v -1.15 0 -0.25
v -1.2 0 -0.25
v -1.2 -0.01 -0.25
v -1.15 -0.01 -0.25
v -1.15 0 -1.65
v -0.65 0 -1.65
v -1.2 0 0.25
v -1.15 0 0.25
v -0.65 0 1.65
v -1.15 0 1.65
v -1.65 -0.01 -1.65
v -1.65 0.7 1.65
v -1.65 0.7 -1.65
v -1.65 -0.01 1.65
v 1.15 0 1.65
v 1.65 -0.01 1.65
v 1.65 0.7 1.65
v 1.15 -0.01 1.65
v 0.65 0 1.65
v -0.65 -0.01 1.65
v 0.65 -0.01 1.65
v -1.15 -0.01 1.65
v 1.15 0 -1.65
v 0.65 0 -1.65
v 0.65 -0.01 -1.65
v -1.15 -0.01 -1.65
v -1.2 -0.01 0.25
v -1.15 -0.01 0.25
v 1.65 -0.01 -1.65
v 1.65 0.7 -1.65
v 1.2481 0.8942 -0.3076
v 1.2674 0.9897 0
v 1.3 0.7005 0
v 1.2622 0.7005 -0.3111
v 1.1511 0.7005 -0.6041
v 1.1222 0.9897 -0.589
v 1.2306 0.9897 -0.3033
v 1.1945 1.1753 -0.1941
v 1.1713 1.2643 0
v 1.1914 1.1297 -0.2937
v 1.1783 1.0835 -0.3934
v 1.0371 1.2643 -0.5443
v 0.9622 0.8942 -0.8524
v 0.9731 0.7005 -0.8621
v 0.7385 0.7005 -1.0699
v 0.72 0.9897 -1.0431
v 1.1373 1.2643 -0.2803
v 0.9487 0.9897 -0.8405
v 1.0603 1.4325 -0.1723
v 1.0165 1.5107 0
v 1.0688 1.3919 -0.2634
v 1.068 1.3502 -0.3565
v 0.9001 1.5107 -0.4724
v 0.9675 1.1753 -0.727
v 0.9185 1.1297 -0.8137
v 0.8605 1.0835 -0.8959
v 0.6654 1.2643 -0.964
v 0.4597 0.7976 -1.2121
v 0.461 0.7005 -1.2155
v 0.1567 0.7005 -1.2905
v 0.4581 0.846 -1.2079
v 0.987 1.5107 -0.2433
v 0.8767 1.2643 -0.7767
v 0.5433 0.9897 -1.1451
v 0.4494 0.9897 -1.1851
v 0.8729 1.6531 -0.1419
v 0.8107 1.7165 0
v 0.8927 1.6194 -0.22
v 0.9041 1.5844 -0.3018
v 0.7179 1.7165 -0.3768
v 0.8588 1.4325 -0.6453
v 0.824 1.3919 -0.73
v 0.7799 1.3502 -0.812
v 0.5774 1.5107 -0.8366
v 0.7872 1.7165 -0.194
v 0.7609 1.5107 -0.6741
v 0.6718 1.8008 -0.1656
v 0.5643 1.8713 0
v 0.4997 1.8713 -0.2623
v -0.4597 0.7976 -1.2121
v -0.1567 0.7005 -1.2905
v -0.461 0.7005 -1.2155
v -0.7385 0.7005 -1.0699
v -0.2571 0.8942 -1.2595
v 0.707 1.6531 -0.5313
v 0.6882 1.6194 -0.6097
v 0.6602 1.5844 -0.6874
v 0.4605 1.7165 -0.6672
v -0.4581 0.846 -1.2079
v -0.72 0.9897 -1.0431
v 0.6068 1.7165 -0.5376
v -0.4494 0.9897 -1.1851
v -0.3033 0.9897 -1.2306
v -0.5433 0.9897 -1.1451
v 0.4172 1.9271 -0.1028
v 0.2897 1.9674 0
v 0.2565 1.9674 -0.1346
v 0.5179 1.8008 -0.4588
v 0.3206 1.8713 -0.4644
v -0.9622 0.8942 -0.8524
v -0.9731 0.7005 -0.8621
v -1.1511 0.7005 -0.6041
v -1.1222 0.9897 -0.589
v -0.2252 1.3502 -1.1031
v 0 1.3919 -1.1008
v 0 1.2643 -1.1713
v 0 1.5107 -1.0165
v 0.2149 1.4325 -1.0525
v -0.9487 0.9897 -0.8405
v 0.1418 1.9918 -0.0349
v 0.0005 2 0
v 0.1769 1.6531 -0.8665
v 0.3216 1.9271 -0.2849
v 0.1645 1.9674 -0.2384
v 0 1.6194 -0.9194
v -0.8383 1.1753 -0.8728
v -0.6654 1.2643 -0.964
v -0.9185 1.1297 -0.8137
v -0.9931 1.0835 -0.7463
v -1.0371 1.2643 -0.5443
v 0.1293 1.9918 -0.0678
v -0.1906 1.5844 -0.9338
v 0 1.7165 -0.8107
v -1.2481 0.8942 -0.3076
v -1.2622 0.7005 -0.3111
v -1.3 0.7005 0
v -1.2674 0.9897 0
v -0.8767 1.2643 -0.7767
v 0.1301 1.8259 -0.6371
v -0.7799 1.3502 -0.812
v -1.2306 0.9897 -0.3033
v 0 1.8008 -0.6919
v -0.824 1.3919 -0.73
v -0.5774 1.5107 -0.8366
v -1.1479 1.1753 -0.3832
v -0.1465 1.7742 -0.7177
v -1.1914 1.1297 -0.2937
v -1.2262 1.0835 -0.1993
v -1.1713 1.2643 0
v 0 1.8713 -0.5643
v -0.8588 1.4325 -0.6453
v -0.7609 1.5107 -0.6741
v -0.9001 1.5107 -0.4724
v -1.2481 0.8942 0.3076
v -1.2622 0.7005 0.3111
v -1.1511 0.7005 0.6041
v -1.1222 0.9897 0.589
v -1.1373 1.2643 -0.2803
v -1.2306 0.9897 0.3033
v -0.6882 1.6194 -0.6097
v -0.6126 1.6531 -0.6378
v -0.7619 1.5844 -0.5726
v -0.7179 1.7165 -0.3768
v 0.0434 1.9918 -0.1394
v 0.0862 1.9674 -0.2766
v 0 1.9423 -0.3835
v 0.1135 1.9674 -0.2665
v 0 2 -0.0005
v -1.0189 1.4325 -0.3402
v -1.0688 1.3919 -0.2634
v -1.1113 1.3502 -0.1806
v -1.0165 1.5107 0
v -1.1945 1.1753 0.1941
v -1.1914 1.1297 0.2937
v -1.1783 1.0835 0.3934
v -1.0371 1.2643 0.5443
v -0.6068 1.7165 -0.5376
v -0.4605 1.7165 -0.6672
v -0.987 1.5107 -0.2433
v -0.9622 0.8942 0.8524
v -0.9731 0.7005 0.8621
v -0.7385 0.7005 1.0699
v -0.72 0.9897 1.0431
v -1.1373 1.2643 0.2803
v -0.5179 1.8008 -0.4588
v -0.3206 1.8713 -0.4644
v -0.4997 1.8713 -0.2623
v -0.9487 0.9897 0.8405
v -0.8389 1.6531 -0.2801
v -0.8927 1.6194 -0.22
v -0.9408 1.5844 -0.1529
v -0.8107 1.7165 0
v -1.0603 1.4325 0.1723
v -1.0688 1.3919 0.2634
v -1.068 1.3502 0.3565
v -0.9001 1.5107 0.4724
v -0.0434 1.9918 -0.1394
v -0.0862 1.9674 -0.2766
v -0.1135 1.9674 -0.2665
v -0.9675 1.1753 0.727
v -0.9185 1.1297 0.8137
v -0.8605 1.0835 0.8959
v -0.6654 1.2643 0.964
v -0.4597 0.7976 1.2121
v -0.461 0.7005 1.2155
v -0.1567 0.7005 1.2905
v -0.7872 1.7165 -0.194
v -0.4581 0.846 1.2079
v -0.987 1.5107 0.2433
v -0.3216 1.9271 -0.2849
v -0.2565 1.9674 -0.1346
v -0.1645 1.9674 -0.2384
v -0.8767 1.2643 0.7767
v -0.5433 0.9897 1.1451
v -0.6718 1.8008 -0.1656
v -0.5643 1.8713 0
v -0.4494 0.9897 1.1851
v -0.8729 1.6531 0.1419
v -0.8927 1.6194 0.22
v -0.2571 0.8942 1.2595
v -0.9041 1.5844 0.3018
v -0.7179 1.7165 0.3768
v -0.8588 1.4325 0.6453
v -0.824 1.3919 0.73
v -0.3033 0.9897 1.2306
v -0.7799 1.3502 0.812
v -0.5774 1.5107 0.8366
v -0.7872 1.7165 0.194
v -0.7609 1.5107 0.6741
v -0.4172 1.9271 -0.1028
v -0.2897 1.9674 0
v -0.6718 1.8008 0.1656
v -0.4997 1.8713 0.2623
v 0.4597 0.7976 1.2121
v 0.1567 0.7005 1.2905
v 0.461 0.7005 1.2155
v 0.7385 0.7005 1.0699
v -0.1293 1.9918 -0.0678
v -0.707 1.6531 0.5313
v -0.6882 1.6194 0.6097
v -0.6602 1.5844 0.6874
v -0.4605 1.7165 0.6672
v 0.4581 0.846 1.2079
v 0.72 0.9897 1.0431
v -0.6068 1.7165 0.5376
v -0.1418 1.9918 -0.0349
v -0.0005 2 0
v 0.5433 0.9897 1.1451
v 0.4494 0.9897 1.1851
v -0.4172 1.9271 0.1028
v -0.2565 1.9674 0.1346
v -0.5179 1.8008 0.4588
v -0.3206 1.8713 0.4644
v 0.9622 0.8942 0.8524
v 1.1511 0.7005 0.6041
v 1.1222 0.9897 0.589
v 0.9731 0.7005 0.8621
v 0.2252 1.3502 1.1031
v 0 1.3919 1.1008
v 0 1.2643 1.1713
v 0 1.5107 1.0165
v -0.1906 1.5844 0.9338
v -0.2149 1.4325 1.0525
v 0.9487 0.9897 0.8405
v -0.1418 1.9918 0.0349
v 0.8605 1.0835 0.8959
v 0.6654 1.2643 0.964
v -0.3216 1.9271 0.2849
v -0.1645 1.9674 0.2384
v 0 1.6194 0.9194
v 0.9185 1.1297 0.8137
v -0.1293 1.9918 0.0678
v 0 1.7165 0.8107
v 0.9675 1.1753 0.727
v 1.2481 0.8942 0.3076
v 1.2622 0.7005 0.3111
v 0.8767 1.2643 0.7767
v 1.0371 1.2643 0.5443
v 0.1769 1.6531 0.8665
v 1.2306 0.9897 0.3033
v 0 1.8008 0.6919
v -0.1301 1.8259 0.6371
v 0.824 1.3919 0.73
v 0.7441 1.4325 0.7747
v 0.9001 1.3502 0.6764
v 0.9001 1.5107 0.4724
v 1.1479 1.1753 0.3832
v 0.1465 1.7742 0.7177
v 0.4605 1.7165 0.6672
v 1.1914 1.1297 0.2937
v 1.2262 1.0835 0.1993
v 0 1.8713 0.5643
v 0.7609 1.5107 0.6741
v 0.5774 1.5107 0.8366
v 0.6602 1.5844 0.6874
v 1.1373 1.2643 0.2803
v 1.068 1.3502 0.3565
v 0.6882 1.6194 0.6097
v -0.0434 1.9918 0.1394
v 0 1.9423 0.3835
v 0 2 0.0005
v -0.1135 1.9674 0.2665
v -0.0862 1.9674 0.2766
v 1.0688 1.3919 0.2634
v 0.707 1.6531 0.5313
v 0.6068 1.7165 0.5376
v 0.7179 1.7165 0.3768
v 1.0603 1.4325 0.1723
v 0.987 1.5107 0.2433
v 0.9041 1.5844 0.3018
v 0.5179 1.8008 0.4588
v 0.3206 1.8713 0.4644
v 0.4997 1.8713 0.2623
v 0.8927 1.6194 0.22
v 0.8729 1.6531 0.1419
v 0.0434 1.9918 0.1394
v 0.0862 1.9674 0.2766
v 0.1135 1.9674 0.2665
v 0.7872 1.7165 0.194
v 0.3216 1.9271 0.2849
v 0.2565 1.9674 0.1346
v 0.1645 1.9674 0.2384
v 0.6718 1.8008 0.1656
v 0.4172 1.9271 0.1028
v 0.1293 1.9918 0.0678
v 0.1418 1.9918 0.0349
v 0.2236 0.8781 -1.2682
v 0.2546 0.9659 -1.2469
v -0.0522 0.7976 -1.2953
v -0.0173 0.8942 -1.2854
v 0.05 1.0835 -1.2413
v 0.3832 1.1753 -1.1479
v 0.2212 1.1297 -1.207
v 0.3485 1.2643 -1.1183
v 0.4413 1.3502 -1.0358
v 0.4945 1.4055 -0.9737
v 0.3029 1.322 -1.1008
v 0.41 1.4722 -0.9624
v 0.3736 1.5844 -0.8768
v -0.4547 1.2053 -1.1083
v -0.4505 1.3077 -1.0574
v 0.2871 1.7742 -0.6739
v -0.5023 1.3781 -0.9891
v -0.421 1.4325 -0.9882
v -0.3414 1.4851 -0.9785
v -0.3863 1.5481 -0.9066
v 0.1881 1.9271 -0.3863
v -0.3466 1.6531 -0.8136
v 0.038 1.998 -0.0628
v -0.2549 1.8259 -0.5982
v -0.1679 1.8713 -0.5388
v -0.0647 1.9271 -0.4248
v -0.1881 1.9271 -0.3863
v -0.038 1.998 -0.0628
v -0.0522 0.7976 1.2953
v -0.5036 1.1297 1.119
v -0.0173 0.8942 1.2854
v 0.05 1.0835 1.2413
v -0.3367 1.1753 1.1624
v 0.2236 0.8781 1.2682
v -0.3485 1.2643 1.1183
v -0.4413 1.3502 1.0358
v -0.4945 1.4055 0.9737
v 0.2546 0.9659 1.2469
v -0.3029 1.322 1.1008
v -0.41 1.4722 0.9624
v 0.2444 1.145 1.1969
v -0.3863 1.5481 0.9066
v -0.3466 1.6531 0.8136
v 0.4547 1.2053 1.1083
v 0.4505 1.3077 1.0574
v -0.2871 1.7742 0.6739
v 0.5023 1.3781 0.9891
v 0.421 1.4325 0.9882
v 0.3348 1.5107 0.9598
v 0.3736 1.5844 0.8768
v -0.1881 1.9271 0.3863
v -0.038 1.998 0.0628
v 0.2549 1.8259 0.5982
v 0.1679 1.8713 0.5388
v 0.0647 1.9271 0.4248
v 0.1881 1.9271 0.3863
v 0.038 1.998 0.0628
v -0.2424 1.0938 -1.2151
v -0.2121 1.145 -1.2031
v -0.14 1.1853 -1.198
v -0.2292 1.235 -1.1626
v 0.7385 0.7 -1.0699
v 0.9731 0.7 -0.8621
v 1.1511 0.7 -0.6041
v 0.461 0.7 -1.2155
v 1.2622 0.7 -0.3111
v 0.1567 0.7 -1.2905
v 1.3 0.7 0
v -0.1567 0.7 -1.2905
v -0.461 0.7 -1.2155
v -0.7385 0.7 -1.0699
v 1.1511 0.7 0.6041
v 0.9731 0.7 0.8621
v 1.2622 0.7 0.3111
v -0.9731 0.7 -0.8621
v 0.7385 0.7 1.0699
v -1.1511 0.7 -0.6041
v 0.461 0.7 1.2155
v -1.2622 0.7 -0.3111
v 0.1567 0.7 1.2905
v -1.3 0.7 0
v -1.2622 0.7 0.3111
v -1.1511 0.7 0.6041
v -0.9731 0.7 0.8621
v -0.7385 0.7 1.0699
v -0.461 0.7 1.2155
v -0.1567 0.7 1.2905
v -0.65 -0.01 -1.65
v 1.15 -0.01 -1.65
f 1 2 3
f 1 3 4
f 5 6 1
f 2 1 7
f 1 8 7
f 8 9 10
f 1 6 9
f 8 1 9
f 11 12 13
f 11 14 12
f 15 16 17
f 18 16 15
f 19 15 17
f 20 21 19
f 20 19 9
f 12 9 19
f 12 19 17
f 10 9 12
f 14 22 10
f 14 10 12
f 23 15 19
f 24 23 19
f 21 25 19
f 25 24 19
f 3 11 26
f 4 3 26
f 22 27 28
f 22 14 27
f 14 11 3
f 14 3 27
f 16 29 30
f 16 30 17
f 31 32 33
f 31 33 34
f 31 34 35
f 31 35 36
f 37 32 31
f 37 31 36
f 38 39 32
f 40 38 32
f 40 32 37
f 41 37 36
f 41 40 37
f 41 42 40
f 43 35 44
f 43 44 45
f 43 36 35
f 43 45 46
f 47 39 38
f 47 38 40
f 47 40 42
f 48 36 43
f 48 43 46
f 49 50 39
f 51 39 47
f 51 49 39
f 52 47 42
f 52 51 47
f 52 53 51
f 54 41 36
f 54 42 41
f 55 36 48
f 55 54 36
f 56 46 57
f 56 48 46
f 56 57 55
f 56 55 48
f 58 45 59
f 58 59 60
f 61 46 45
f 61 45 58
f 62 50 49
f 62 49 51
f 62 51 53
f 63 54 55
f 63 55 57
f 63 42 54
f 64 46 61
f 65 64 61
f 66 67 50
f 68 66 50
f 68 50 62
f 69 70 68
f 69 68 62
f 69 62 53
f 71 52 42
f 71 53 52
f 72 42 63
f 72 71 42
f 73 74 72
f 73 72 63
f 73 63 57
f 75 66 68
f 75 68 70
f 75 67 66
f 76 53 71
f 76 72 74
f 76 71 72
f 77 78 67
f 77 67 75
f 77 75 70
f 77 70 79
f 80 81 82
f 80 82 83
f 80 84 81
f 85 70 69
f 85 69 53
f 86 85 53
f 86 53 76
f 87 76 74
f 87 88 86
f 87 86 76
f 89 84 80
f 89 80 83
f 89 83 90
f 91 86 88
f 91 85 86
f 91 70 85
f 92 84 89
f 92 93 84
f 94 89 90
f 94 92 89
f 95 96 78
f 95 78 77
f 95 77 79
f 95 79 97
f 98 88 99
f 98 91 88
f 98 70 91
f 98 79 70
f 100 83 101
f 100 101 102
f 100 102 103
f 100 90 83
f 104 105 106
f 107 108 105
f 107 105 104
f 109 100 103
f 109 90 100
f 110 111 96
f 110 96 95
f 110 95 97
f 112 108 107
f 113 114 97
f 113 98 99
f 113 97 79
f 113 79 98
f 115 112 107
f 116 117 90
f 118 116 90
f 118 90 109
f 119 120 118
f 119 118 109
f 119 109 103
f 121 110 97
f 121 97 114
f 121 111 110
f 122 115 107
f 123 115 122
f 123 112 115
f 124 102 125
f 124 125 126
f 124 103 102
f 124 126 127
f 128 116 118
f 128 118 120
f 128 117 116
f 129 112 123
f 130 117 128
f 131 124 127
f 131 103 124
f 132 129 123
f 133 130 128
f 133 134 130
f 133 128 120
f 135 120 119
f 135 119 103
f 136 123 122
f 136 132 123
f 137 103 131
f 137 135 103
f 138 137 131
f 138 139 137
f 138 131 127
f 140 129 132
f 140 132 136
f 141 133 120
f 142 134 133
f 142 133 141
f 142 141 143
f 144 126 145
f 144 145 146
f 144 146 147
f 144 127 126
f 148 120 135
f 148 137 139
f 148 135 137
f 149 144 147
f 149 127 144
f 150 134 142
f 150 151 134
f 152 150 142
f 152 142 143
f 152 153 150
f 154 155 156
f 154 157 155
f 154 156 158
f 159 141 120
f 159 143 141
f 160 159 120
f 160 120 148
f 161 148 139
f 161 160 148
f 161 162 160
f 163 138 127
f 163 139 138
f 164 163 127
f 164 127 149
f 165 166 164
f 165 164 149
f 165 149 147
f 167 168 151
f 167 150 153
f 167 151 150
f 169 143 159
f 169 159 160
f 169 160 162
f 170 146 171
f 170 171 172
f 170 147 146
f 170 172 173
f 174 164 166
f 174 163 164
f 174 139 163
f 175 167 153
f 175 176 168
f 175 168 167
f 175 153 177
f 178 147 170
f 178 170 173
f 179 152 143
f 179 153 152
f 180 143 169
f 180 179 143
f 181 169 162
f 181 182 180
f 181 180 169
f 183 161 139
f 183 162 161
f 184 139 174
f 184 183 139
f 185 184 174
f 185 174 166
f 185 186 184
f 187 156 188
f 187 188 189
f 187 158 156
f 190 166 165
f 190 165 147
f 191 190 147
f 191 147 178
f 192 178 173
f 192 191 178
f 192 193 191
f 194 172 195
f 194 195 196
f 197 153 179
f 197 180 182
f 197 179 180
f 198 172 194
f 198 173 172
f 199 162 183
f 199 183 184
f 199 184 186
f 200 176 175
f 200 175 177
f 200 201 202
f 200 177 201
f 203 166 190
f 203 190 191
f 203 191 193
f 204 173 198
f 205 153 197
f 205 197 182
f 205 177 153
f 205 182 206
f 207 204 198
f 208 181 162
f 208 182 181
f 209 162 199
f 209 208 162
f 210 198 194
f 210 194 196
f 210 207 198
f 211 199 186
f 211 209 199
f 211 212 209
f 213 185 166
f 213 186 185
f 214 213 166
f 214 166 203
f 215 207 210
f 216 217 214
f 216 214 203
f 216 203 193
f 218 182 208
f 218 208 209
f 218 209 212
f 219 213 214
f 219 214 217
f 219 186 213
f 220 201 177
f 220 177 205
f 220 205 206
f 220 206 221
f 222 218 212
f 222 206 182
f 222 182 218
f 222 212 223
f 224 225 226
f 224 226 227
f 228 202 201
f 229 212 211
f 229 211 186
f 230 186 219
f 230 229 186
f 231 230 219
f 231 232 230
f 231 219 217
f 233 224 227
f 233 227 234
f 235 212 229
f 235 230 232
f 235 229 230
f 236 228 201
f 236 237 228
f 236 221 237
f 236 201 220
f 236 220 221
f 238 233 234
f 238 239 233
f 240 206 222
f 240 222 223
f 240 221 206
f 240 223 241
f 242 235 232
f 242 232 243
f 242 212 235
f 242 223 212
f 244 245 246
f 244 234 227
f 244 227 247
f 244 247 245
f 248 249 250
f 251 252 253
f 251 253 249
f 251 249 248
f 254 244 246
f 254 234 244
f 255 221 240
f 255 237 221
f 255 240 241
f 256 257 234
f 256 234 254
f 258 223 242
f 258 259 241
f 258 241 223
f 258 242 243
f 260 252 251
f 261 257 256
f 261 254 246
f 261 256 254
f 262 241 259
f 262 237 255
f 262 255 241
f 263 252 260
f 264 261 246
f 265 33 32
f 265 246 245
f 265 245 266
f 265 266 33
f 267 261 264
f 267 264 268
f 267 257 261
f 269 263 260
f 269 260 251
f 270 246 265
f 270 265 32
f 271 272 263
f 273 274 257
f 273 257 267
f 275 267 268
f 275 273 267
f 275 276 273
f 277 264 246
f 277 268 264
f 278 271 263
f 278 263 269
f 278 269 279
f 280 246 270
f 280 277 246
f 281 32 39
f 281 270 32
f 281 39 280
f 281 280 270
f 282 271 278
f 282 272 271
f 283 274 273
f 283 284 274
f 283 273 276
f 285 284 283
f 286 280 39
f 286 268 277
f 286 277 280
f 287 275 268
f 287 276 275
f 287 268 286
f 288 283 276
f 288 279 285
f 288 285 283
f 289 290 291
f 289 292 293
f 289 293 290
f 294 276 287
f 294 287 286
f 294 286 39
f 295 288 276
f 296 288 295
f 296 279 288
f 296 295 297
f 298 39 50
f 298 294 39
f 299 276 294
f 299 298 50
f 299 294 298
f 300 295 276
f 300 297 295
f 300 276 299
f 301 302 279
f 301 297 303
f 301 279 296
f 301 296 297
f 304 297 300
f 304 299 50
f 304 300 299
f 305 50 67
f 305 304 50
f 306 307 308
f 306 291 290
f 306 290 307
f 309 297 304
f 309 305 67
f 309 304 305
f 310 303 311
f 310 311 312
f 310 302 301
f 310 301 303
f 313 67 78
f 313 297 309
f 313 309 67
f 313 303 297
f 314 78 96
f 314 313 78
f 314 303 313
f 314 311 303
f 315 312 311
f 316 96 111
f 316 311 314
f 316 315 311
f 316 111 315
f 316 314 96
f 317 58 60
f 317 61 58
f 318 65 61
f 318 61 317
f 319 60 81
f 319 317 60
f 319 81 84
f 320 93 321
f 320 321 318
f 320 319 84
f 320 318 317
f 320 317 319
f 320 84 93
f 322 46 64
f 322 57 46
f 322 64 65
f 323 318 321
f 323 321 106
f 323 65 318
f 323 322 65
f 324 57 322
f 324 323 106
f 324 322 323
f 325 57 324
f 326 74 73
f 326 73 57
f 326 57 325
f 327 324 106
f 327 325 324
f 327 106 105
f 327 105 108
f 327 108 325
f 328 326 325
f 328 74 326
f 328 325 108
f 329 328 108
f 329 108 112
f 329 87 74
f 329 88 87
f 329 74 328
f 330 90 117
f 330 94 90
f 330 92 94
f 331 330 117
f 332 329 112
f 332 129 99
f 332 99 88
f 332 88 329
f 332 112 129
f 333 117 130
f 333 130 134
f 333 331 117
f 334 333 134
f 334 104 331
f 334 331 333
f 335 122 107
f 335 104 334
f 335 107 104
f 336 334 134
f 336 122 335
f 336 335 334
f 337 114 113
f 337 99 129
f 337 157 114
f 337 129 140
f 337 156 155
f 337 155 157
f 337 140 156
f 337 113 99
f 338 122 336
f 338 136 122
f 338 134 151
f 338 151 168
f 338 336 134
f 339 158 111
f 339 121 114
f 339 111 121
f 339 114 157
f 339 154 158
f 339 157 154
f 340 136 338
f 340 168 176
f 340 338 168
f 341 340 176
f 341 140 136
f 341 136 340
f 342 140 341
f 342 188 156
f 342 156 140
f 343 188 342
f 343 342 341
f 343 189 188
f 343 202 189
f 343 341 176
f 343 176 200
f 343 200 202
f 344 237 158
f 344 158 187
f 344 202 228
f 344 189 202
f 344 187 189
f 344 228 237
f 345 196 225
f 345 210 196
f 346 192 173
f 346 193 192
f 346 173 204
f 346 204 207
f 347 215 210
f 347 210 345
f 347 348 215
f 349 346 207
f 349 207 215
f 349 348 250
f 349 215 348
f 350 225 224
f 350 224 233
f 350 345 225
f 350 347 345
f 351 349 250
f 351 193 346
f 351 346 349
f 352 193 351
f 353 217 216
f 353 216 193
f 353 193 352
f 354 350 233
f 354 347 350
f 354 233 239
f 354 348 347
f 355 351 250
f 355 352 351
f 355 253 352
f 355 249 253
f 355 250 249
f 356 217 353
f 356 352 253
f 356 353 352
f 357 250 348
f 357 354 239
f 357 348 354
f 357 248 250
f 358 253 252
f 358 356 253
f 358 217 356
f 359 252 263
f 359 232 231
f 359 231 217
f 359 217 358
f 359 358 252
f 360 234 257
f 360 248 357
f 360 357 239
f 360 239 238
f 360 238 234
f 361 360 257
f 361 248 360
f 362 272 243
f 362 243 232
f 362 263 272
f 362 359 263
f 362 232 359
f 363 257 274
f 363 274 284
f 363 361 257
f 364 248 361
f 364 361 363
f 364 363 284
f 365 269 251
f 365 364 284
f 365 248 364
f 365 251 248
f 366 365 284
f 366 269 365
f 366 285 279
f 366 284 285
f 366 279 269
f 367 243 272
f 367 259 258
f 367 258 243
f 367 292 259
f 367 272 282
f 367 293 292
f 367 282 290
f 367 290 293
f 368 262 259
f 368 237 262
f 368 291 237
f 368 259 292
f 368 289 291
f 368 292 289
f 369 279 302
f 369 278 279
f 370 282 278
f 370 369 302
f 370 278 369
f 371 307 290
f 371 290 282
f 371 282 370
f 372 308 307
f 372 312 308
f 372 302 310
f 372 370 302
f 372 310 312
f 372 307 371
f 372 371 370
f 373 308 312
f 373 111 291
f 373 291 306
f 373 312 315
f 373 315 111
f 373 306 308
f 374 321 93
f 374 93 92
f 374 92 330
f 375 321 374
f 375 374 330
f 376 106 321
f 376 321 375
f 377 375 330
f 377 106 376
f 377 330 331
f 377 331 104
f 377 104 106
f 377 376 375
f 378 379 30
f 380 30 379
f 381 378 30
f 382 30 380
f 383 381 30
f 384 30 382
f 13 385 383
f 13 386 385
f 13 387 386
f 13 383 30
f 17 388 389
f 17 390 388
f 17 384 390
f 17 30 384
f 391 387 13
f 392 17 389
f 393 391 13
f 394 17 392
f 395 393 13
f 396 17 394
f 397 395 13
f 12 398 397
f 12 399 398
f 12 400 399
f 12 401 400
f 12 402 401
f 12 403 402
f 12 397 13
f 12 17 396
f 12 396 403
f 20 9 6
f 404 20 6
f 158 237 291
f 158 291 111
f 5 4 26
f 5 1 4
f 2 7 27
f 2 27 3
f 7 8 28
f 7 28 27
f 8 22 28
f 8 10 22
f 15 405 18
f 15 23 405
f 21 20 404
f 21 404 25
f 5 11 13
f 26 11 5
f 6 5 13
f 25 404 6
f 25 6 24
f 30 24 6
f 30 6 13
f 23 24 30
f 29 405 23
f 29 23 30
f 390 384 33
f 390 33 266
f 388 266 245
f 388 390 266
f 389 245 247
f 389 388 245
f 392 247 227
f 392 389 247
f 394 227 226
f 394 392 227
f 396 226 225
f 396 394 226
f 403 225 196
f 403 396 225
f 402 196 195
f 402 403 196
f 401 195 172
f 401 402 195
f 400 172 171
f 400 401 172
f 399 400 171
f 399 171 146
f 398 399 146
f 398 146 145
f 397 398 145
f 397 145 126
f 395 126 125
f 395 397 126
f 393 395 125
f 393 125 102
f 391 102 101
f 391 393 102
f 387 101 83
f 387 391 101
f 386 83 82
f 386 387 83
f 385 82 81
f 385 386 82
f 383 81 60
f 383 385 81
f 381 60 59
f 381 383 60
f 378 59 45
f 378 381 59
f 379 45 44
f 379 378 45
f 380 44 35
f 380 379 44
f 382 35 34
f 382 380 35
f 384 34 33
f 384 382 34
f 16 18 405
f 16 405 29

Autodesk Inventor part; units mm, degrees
ref_plane "YZ Plane" through (0, 0, 0) normal (1, 0, 0) x (0, 1, 0)
ref_plane "XZ Plane" through (0, 0, 0) normal (0, 1, 0) x (-1, 0, 0)
ref_plane "XY Plane" through (0, 0, 0) normal (0, 0, 1) x (1, 0, 0)
sketch "Skizze3" plane through (0, 0, 0) normal (0, 1, 0) x (-1, 0, 0)
  line L0 (1.65, -1.65) -> (-1.65, -1.65)
  line L1 (-1.65, -1.65) -> (-1.65, 1.65)
  line L2 (-1.65, 1.65) -> (1.65, 1.65)
  line L3 (1.65, 1.65) -> (1.65, -1.65)
  line L4 (1.65, -1.65) -> (-1.65, 1.65) construction
  line L5 (-1.65, -1.65) -> (1.65, 1.65) construction
  point P0 (0, 0)
  dimension "d5" = 3.3
  dimension "d6" = 3.3
extrude "Extrusion2" add sketch "Skizze3" along normal blind 0.7
sketch "Skizze5" plane through (0, 0, 0) normal (0, -1, 0) x (1, 0, 0)
  line L0 (1.65, -1.65) -> (-1.65, -1.65) projected
  line L1 (1.65, 1.65) -> (1.65, -1.65) projected
  line L2 (-1.65, 1.65) -> (1.65, 1.65) projected
  line L3 (-1.65, -1.65) -> (-1.65, 1.65) projected
  line L4 (-0.65, -1.65) -> (0.65, -1.65)
  line L5 (0.65, -1.65) -> (0.65, 1.65)
  line L6 (0.65, 1.65) -> (-0.65, 1.65)
  line L7 (-0.65, 1.65) -> (-0.65, -1.65)
  line L8 (-0.65, -1.65) -> (0.65, 1.65) construction
  line L9 (0.65, -1.65) -> (-0.65, 1.65) construction
  line L10 (-1.65, 0) -> (1.65, 0) construction
  line L11 (1.15, 1.65) -> (1.65, 1.65)
  line L12 (1.65, 1.65) -> (1.65, -1.65)
  line L13 (1.65, -1.65) -> (1.15, -1.65)
  line L14 (1.15, -1.65) -> (1.15, 1.65)
  line L15 (1.15, 1.65) -> (1.65, -1.65) construction
  line L16 (1.65, 1.65) -> (1.15, -1.65) construction
  line L17 (-1.65, 1.65) -> (-1.15, 1.65)
  line L18 (-1.15, -1.65) -> (-1.65, -1.65)
  line L19 (-1.65, -1.65) -> (-1.65, 1.65)
  line L20 (-1.65, 1.65) -> (-1.15, -1.65) construction
  line L21 (-1.15, 1.65) -> (-1.65, -1.65) construction
  line L22 (-1.15, 0.25) -> (-1.2, 0.25)
  line L23 (-1.2, 0.25) -> (-1.2, -0.25)
  line L24 (-1.2, -0.25) -> (-1.15, -0.25)
  line L25 (-1.15, 1.65) -> (-1.15, 0.25)
  line L26 (-1.15, -0.25) -> (-1.15, -1.65)
  point P0 (0, 0)
  point P1 (1.4, 0)
  point P2 (-1.4, 0)
  dimension "d13" = 1.3
  dimension "d14" = 3.3
  dimension "d15" = 0.5
  dimension "d16" = 3.3
  dimension "d19" = 1.4
  dimension "d20" = 0.5
  dimension "d21" = 3.3
  dimension "d22" = 1.4
  dimension "d26" = 0.5
  dimension "d27" = 0.05
  dimension "d28" = 1.4
sketch "Skizze4" plane through (0, 0.7, 0) normal (0, 1, 0) x (1, 0, 0)
  line L0 (1.65, 1.65) -> (-1.65, 1.65) projected
  circle A0 centre (0, 0) radius 1.3
  dimension "d9" = 2.6
extrude "Extrusion3" add sketch "Skizze4" along normal blind 1.3
fillet "Rundung1" radius 1.3 1 edges at (-1.3, 2, 0)
extrude "Extrusion5" add sketch "Skizze5" along normal blind 0.01 contours L0 L14 L2 L1 | L0 L7 L2 L5 | L0 L3 L2 L25 L22 L23 L24 L26
properties part number "IN-3531SCUV"
